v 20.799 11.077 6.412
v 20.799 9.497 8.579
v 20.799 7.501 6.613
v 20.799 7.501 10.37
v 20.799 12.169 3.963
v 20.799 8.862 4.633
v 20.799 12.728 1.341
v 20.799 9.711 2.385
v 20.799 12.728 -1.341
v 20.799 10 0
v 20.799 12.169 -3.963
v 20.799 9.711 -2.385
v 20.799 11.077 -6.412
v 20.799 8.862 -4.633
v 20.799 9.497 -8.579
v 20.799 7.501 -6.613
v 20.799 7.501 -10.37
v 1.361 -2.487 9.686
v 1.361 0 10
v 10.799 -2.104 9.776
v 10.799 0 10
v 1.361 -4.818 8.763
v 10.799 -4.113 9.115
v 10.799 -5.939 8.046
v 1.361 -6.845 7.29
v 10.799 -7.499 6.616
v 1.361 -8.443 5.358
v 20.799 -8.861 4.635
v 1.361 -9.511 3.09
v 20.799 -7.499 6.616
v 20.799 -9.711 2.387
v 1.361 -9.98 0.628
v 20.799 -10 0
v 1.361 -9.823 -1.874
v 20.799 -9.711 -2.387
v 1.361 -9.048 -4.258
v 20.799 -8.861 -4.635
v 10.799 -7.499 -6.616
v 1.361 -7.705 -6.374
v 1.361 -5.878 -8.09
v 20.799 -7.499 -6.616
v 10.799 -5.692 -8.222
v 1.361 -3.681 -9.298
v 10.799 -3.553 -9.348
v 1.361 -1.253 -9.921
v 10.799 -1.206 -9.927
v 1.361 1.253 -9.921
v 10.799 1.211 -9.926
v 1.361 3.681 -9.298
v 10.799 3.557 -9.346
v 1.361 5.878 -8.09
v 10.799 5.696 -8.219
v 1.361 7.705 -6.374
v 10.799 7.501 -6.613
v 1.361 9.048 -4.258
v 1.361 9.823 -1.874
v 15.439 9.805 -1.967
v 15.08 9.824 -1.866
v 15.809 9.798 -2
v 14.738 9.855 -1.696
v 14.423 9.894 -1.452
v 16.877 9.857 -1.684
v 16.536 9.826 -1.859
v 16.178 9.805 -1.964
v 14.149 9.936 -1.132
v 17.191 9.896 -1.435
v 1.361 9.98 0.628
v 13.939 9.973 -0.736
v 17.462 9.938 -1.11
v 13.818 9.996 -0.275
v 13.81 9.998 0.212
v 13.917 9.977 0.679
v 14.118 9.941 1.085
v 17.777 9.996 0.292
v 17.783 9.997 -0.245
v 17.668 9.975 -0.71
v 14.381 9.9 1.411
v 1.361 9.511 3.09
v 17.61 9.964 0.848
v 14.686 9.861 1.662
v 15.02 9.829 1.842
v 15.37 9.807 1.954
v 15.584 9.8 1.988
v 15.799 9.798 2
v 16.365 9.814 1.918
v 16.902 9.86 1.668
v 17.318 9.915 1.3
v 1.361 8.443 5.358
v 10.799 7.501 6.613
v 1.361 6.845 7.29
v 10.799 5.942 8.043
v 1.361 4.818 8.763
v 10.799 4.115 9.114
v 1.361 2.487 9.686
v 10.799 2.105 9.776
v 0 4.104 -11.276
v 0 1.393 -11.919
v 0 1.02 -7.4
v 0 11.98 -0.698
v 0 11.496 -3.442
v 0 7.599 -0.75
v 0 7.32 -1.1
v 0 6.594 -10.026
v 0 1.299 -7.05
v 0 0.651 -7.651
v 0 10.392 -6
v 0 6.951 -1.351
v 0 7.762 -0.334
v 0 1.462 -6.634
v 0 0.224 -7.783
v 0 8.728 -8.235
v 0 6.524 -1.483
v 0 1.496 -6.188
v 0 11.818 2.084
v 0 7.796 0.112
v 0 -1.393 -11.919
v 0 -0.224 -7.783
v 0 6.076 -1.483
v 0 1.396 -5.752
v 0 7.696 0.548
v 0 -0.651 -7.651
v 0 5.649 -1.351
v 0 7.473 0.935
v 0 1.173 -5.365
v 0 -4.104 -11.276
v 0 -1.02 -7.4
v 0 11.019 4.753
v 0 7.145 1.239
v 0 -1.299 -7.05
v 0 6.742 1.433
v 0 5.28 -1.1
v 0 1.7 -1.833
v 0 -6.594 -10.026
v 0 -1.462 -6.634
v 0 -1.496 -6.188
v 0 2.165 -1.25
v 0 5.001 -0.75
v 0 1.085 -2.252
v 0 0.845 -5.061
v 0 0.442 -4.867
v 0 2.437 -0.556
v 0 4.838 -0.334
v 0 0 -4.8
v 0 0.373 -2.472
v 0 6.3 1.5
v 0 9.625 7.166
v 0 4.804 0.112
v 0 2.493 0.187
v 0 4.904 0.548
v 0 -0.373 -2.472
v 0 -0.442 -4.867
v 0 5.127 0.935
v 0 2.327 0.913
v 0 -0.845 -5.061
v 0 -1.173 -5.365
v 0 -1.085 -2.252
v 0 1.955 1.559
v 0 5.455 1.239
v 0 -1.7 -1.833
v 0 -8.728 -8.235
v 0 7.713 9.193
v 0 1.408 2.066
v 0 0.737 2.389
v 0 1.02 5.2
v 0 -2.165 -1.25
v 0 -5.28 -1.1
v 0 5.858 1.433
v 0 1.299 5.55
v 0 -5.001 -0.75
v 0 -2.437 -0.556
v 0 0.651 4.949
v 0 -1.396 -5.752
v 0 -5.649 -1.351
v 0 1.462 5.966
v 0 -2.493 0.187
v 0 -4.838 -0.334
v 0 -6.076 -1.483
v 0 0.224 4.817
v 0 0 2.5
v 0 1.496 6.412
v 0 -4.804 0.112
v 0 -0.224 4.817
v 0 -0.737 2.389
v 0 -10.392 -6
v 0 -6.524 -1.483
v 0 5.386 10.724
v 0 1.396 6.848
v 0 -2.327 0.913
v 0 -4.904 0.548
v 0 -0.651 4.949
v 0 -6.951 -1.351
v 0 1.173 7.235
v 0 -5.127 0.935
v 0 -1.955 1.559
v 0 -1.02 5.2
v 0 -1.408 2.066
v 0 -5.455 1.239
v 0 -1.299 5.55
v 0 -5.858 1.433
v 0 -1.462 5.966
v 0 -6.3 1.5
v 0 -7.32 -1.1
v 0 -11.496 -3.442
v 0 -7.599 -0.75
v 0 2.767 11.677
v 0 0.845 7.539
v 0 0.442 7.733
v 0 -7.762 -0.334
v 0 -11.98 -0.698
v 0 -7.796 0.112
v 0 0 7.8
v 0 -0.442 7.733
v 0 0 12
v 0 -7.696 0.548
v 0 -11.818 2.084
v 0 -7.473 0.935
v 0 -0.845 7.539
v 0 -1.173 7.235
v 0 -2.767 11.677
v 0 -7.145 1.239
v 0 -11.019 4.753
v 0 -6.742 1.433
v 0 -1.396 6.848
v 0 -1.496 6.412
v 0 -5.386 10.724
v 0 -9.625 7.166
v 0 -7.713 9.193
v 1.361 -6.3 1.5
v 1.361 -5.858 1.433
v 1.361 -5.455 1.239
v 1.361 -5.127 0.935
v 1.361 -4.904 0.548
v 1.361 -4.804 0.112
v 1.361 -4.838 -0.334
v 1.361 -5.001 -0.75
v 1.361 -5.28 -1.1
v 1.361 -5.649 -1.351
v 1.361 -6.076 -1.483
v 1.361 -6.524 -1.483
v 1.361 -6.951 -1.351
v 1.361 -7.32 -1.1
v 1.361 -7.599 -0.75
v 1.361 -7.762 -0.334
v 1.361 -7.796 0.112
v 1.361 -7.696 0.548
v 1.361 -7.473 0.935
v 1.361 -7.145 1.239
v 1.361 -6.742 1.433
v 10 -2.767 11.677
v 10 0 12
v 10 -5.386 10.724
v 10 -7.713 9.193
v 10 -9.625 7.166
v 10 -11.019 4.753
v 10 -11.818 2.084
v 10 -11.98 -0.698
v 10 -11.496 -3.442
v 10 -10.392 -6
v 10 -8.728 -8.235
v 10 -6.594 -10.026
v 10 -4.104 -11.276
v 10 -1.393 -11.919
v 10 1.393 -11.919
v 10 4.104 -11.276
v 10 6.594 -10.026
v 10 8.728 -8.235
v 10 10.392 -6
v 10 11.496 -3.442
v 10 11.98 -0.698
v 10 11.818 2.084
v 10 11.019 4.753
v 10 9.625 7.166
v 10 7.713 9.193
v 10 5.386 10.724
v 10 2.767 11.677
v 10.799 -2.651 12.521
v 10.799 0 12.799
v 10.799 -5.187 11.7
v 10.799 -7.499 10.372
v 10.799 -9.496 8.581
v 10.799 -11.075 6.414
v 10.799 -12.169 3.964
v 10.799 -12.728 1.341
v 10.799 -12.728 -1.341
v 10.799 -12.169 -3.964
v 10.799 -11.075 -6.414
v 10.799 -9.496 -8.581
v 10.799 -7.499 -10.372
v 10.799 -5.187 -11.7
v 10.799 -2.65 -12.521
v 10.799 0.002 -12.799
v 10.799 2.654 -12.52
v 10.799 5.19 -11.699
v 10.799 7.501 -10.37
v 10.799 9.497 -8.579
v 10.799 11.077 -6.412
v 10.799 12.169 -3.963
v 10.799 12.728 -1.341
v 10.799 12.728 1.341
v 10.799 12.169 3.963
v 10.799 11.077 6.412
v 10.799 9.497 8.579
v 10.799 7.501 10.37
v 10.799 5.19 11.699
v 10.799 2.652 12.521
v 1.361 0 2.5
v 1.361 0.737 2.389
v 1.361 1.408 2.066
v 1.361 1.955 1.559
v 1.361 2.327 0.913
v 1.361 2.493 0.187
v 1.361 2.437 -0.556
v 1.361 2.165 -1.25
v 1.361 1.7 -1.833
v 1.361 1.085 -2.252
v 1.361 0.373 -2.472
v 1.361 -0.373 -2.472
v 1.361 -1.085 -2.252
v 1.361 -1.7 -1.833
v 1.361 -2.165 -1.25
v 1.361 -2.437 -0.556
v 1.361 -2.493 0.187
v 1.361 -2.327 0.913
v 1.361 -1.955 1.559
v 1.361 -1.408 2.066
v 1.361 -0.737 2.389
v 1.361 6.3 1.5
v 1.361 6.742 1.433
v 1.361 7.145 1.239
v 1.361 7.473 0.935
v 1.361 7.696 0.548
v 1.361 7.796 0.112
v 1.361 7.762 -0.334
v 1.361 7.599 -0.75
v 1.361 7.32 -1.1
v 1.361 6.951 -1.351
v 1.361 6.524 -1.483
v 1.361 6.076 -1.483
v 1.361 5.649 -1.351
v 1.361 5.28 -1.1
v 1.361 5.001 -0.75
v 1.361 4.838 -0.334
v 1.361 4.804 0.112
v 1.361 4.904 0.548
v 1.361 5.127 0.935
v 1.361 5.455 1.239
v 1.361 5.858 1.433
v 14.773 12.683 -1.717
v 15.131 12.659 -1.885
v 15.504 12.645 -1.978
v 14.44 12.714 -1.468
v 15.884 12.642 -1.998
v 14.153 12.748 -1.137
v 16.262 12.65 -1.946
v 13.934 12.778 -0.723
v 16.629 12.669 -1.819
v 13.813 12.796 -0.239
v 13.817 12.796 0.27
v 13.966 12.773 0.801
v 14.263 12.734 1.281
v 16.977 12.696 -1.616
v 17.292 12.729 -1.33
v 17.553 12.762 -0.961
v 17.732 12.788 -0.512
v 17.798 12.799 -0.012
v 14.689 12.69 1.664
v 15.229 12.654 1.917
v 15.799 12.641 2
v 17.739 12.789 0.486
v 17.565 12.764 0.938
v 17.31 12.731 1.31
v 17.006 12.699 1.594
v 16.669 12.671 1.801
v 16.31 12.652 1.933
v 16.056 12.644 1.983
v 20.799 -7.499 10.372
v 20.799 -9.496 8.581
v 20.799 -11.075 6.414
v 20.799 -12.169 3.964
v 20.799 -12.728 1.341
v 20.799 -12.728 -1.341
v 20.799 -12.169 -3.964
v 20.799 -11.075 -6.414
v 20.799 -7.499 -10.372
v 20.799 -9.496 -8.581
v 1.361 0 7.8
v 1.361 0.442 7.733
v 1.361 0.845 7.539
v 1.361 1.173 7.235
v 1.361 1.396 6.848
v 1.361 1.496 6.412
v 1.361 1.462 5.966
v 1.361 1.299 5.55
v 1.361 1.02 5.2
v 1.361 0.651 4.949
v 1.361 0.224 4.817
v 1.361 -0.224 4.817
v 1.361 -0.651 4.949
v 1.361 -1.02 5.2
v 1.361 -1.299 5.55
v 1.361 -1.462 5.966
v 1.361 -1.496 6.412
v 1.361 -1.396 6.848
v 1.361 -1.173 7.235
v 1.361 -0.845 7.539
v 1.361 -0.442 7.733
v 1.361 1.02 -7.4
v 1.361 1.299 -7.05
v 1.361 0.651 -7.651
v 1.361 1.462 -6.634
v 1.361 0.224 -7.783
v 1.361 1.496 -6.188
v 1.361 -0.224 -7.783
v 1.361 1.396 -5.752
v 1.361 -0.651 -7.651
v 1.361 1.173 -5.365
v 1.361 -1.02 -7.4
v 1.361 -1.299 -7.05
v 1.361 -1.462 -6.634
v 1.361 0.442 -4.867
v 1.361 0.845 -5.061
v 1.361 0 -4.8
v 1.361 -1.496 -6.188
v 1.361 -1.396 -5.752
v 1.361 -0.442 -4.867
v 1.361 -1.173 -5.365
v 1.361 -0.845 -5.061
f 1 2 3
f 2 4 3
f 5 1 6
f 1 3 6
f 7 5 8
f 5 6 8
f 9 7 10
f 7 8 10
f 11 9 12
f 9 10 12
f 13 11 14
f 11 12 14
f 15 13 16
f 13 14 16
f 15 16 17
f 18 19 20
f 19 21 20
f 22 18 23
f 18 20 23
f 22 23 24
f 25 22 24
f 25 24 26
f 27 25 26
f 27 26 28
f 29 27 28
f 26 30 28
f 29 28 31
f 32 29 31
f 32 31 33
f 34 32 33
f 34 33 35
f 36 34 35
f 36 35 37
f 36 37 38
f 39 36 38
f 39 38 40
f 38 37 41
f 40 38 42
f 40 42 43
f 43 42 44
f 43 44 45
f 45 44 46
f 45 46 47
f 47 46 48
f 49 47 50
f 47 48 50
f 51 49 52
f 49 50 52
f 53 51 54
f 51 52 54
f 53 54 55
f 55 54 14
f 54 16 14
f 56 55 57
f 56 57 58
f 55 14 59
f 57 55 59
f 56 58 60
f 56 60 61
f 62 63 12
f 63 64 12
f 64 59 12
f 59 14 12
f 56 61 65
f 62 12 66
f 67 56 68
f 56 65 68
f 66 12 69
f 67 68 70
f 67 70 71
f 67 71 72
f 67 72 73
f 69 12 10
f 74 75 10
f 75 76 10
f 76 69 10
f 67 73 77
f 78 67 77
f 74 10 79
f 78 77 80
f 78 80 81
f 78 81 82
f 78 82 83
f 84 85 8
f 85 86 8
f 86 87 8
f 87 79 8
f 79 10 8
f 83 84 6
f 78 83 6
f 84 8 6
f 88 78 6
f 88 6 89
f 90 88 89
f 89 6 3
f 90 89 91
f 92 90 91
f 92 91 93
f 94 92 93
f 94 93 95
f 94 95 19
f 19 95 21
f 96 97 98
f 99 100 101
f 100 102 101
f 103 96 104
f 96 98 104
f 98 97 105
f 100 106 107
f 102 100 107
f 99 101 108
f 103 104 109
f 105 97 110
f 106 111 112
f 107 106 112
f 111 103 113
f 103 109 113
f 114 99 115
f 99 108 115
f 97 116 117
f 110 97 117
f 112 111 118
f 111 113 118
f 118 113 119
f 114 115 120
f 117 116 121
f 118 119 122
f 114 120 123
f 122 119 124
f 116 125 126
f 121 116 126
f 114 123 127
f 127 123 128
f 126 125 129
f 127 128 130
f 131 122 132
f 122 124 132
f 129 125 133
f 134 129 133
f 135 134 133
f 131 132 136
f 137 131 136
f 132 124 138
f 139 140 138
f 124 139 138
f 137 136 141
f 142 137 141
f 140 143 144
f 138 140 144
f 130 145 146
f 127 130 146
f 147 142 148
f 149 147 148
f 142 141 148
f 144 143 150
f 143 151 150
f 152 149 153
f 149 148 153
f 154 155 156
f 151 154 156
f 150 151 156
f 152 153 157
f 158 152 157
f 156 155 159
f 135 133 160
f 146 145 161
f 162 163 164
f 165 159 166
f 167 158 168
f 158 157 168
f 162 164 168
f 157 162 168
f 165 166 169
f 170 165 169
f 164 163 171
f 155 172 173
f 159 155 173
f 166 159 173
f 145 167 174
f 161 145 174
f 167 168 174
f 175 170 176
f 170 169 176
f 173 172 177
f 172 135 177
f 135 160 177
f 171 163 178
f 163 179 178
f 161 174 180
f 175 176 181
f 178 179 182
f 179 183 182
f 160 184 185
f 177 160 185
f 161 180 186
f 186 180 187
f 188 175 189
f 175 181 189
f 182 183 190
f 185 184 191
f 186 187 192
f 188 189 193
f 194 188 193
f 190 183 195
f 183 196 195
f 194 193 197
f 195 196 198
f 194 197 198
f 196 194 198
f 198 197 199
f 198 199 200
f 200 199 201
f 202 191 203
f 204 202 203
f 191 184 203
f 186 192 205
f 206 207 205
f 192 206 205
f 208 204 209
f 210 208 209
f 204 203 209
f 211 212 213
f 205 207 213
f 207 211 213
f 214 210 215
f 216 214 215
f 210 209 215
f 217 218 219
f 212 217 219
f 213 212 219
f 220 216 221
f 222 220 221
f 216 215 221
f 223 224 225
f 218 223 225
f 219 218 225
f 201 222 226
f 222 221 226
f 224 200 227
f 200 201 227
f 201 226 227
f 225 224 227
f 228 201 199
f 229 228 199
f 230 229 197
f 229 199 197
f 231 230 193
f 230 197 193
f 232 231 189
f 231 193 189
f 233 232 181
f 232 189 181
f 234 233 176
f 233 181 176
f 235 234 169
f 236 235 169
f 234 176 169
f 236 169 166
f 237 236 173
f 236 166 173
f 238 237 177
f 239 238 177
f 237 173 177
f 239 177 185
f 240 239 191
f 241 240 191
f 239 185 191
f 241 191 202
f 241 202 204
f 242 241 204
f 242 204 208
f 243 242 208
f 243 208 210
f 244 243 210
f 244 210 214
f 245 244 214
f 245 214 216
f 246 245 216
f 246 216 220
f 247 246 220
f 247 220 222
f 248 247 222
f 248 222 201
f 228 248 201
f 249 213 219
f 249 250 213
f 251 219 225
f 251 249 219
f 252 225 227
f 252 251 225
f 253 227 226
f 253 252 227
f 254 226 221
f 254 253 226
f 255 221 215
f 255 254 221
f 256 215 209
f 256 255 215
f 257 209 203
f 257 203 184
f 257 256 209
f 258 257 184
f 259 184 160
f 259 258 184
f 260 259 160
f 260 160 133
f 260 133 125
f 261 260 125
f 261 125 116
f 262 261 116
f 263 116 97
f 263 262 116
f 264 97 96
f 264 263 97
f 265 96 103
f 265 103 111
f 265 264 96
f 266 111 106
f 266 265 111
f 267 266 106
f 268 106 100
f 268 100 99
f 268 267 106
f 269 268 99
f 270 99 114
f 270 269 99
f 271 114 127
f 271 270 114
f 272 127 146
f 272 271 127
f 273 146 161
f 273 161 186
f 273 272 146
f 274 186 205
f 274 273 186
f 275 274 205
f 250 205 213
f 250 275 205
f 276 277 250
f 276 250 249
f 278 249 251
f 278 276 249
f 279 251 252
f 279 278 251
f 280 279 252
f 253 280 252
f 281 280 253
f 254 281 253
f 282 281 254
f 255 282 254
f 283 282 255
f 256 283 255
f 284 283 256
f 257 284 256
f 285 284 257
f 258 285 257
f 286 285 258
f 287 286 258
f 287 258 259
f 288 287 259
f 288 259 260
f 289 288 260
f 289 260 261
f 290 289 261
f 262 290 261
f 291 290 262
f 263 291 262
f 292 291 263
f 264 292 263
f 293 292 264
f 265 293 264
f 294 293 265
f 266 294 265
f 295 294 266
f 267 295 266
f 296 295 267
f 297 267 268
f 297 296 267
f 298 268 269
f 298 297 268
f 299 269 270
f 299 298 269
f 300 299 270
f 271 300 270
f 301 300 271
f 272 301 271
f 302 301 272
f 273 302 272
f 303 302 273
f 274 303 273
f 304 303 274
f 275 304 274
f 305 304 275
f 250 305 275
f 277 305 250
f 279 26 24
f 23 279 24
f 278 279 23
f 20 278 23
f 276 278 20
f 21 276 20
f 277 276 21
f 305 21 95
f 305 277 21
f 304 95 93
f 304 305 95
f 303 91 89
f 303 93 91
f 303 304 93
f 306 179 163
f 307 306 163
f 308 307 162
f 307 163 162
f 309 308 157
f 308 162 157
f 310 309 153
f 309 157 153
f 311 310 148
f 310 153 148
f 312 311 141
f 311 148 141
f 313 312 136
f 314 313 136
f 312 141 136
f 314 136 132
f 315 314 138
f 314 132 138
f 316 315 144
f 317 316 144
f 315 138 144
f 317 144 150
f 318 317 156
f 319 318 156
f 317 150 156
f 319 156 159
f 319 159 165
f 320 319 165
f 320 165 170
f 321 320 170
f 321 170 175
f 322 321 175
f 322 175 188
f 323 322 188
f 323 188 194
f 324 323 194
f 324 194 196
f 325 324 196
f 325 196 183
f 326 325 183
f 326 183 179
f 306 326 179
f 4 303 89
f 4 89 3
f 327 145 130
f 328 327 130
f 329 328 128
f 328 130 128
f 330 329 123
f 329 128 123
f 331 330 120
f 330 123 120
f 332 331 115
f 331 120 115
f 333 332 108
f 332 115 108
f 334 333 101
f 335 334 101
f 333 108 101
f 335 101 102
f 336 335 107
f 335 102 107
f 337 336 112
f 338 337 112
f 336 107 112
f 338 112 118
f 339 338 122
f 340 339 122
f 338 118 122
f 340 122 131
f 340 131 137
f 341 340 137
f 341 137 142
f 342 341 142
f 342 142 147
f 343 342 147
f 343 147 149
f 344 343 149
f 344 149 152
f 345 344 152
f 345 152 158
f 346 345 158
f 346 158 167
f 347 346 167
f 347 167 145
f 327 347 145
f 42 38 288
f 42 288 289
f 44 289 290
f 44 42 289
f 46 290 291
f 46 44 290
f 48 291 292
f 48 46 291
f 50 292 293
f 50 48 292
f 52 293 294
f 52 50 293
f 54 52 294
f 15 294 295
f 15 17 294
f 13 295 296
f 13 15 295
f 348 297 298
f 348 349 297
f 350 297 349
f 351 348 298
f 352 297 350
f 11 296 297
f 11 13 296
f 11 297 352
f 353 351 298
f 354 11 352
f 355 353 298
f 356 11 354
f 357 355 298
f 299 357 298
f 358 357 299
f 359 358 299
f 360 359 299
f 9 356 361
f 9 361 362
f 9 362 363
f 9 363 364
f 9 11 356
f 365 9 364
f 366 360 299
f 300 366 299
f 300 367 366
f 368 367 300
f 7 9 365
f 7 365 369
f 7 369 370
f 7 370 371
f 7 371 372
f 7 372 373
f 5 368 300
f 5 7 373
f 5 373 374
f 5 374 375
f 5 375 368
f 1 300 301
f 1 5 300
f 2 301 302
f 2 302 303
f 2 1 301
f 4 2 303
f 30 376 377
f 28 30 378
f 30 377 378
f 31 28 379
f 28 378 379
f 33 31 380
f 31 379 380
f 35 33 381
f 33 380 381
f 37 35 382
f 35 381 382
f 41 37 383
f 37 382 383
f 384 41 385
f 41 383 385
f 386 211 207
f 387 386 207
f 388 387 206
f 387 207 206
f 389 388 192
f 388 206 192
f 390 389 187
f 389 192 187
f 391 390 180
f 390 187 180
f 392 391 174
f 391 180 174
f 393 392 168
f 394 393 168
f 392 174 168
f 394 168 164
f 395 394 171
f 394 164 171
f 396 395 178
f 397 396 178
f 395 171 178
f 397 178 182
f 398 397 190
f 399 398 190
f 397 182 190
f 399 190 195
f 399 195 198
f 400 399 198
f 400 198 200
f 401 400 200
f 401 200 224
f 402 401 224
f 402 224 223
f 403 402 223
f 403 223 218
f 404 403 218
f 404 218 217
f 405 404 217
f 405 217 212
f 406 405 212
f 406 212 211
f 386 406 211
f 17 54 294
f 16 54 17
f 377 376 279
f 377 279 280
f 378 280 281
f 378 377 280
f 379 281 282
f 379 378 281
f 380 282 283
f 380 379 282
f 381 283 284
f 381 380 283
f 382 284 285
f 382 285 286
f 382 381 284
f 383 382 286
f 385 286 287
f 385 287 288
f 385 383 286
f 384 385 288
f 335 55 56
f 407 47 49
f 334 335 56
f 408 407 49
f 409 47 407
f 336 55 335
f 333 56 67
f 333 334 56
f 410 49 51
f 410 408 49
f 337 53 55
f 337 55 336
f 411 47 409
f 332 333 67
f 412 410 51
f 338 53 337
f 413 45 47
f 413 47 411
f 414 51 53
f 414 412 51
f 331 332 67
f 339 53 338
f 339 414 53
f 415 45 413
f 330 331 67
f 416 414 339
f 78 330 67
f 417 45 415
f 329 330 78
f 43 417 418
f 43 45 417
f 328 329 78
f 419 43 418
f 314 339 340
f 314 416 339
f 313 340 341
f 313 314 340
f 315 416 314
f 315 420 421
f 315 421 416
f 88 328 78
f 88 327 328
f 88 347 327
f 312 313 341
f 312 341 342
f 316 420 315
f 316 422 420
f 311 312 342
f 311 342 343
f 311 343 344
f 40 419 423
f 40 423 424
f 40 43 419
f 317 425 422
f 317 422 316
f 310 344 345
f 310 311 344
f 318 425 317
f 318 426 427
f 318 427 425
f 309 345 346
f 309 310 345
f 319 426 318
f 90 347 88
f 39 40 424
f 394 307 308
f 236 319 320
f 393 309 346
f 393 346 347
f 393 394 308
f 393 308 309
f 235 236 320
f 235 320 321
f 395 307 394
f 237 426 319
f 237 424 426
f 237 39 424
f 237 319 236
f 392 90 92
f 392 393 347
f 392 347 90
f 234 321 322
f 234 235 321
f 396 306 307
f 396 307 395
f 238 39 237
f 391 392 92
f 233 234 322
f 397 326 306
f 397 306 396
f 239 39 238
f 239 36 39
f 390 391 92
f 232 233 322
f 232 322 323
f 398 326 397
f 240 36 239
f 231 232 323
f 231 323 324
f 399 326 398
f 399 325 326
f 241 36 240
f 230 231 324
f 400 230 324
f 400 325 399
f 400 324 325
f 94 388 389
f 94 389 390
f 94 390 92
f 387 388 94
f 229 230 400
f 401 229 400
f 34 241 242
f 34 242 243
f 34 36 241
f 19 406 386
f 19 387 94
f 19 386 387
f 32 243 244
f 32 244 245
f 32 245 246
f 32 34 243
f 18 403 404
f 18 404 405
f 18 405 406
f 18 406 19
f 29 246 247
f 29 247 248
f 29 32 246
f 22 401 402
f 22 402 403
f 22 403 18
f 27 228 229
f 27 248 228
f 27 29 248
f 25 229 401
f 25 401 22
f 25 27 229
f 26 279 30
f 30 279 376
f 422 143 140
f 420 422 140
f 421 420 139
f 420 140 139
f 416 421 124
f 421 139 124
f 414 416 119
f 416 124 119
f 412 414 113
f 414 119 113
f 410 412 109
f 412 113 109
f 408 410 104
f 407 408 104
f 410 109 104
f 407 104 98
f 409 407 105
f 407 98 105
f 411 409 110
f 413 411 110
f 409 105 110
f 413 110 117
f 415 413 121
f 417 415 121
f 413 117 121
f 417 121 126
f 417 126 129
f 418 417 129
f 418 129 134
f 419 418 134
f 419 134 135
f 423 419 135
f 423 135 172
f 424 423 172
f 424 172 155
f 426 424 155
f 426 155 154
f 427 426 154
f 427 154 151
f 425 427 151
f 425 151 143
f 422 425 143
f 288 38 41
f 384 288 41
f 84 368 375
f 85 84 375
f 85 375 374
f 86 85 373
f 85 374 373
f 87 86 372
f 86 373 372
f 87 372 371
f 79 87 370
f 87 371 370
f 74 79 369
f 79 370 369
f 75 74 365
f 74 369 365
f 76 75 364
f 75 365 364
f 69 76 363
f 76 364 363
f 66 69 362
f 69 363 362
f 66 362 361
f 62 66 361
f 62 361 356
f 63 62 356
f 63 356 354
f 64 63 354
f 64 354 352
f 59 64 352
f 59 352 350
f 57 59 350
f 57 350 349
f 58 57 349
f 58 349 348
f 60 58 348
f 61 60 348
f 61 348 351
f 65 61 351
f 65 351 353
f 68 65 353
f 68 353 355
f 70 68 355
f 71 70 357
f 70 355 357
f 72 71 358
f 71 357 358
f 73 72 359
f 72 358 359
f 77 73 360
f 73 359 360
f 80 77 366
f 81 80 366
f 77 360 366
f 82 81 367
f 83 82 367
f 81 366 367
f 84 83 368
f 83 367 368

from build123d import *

# Parameters (mm, degrees)
ENL_V_MAT_EXTRU_1_REACH      = 29.571
ESQUISSE2_R                  = 2.5
ESQUISSE2_R_2                = 1.5
ENL_V_MAT_EXTRU_2_DEPTH      = 28.571390703
ENL_V_MAT_EXTRU_2_DEPTH_BACK = 28.571390703
ESQUISSE4_W                  = 15
ESQUISSE4_H                  = 10
ESQUISSE5_R                  = 2
ENL_V_MAT_EXTRU_3_DEPTH      = 10


with BuildPart() as part:
    # Esquisse1 → Révolution1 (revolve)
    with BuildSketch(Plane.XY, mode=Mode.PRIVATE) as r_volution1_sk:
        Polygon((0, 12), (10, 12), (10.798508391, 12.798508391), (20.798508391, 12.798508391), (20.798508391, 10.798508391), (20.798508391, 10), (12.242640687, 10), (1.360795334, 10), (1.360795334, 0), (0, 0), (0, 10), align=None)
    revolve(r_volution1_sk.sketch.rotate(Axis((0, 0, 0), (1, 0, 0)), 90), axis=Axis((0, 0, 0), (1, 0, 0)))

    # Esquisse2 → Enlèv. mat.-Extru.1 (cut, up to next)
    with BuildSketch(Plane.ZY, mode=Mode.PRIVATE) as enl_v_mat_extru_1_sk1:
        Circle(ESQUISSE2_R)
    enl_v_mat_extru_1_tool1 = extrude(enl_v_mat_extru_1_sk1.sketch, amount=-ENL_V_MAT_EXTRU_1_REACH, mode=Mode.PRIVATE) & part.part
    # Esquisse2 → Enlèv. mat.-Extru.1 (cut, up to next)
    with BuildSketch(Plane.ZY, mode=Mode.PRIVATE) as enl_v_mat_extru_1_sk2:
        with Locations((0, 6.3)):
            Circle(ESQUISSE2_R_2)
    enl_v_mat_extru_1_tool2 = extrude(enl_v_mat_extru_1_sk2.sketch, amount=-ENL_V_MAT_EXTRU_1_REACH, mode=Mode.PRIVATE) & part.part
    # Esquisse2 → Enlèv. mat.-Extru.1 (cut, up to next)
    with BuildSketch(Plane.ZY, mode=Mode.PRIVATE) as enl_v_mat_extru_1_sk3:
        with Locations((6.3, 0)):
            Circle(ESQUISSE2_R_2)
    enl_v_mat_extru_1_tool3 = extrude(enl_v_mat_extru_1_sk3.sketch, amount=-ENL_V_MAT_EXTRU_1_REACH, mode=Mode.PRIVATE) & part.part
    # Esquisse2 → Enlèv. mat.-Extru.1 (cut, up to next)
    with BuildSketch(Plane.ZY, mode=Mode.PRIVATE) as enl_v_mat_extru_1_sk4:
        with Locations((0, -6.3)):
            Circle(ESQUISSE2_R_2)
    enl_v_mat_extru_1_tool4 = extrude(enl_v_mat_extru_1_sk4.sketch, amount=-ENL_V_MAT_EXTRU_1_REACH, mode=Mode.PRIVATE) & part.part
    # Esquisse2 → Enlèv. mat.-Extru.1 (cut, up to next)
    with BuildSketch(Plane.ZY, mode=Mode.PRIVATE) as enl_v_mat_extru_1_sk5:
        with Locations((-6.3, 0)):
            Circle(ESQUISSE2_R_2)
    enl_v_mat_extru_1_tool5 = extrude(enl_v_mat_extru_1_sk5.sketch, amount=-ENL_V_MAT_EXTRU_1_REACH, mode=Mode.PRIVATE) & part.part
    add(enl_v_mat_extru_1_tool1.solids().sort_by_distance((0, 0, 0))[0], mode=Mode.SUBTRACT)
    add(enl_v_mat_extru_1_tool2.solids().sort_by_distance((0, 6.3, 0))[0], mode=Mode.SUBTRACT)
    add(enl_v_mat_extru_1_tool3.solids().sort_by_distance((0, 0, 6.3))[0], mode=Mode.SUBTRACT)
    add(enl_v_mat_extru_1_tool4.solids().sort_by_distance((0, -6.3, 0))[0], mode=Mode.SUBTRACT)
    add(enl_v_mat_extru_1_tool5.solids().sort_by_distance((0, 0, -6.3))[0], mode=Mode.SUBTRACT)

    # Esquisse4 → Enlèv. mat.-Extru.2 (cut, two sides: drawn at the far end of the back side and taken through both)
    with BuildSketch(Plane.YX.offset(-ENL_V_MAT_EXTRU_2_DEPTH_BACK)):
        with Locations((0.001491609, 15.798508391)):
            Rectangle(ESQUISSE4_W, ESQUISSE4_H)
    extrude(amount=ENL_V_MAT_EXTRU_2_DEPTH + ENL_V_MAT_EXTRU_2_DEPTH_BACK, mode=Mode.SUBTRACT)

    # Esquisse5 → Enlèv. mat.-Extru.3 (cut)
    with BuildSketch(Plane(origin=(0, 12.798508391, 0), x_dir=(1, 0, 0), z_dir=(0, 1, 0))):
        with Locations(Location((15.798508391, 0, 0), (0, 0, 270))):
            Circle(ESQUISSE5_R)
    extrude(amount=-ENL_V_MAT_EXTRU_3_DEPTH, mode=Mode.SUBTRACT)


solid = part.part
